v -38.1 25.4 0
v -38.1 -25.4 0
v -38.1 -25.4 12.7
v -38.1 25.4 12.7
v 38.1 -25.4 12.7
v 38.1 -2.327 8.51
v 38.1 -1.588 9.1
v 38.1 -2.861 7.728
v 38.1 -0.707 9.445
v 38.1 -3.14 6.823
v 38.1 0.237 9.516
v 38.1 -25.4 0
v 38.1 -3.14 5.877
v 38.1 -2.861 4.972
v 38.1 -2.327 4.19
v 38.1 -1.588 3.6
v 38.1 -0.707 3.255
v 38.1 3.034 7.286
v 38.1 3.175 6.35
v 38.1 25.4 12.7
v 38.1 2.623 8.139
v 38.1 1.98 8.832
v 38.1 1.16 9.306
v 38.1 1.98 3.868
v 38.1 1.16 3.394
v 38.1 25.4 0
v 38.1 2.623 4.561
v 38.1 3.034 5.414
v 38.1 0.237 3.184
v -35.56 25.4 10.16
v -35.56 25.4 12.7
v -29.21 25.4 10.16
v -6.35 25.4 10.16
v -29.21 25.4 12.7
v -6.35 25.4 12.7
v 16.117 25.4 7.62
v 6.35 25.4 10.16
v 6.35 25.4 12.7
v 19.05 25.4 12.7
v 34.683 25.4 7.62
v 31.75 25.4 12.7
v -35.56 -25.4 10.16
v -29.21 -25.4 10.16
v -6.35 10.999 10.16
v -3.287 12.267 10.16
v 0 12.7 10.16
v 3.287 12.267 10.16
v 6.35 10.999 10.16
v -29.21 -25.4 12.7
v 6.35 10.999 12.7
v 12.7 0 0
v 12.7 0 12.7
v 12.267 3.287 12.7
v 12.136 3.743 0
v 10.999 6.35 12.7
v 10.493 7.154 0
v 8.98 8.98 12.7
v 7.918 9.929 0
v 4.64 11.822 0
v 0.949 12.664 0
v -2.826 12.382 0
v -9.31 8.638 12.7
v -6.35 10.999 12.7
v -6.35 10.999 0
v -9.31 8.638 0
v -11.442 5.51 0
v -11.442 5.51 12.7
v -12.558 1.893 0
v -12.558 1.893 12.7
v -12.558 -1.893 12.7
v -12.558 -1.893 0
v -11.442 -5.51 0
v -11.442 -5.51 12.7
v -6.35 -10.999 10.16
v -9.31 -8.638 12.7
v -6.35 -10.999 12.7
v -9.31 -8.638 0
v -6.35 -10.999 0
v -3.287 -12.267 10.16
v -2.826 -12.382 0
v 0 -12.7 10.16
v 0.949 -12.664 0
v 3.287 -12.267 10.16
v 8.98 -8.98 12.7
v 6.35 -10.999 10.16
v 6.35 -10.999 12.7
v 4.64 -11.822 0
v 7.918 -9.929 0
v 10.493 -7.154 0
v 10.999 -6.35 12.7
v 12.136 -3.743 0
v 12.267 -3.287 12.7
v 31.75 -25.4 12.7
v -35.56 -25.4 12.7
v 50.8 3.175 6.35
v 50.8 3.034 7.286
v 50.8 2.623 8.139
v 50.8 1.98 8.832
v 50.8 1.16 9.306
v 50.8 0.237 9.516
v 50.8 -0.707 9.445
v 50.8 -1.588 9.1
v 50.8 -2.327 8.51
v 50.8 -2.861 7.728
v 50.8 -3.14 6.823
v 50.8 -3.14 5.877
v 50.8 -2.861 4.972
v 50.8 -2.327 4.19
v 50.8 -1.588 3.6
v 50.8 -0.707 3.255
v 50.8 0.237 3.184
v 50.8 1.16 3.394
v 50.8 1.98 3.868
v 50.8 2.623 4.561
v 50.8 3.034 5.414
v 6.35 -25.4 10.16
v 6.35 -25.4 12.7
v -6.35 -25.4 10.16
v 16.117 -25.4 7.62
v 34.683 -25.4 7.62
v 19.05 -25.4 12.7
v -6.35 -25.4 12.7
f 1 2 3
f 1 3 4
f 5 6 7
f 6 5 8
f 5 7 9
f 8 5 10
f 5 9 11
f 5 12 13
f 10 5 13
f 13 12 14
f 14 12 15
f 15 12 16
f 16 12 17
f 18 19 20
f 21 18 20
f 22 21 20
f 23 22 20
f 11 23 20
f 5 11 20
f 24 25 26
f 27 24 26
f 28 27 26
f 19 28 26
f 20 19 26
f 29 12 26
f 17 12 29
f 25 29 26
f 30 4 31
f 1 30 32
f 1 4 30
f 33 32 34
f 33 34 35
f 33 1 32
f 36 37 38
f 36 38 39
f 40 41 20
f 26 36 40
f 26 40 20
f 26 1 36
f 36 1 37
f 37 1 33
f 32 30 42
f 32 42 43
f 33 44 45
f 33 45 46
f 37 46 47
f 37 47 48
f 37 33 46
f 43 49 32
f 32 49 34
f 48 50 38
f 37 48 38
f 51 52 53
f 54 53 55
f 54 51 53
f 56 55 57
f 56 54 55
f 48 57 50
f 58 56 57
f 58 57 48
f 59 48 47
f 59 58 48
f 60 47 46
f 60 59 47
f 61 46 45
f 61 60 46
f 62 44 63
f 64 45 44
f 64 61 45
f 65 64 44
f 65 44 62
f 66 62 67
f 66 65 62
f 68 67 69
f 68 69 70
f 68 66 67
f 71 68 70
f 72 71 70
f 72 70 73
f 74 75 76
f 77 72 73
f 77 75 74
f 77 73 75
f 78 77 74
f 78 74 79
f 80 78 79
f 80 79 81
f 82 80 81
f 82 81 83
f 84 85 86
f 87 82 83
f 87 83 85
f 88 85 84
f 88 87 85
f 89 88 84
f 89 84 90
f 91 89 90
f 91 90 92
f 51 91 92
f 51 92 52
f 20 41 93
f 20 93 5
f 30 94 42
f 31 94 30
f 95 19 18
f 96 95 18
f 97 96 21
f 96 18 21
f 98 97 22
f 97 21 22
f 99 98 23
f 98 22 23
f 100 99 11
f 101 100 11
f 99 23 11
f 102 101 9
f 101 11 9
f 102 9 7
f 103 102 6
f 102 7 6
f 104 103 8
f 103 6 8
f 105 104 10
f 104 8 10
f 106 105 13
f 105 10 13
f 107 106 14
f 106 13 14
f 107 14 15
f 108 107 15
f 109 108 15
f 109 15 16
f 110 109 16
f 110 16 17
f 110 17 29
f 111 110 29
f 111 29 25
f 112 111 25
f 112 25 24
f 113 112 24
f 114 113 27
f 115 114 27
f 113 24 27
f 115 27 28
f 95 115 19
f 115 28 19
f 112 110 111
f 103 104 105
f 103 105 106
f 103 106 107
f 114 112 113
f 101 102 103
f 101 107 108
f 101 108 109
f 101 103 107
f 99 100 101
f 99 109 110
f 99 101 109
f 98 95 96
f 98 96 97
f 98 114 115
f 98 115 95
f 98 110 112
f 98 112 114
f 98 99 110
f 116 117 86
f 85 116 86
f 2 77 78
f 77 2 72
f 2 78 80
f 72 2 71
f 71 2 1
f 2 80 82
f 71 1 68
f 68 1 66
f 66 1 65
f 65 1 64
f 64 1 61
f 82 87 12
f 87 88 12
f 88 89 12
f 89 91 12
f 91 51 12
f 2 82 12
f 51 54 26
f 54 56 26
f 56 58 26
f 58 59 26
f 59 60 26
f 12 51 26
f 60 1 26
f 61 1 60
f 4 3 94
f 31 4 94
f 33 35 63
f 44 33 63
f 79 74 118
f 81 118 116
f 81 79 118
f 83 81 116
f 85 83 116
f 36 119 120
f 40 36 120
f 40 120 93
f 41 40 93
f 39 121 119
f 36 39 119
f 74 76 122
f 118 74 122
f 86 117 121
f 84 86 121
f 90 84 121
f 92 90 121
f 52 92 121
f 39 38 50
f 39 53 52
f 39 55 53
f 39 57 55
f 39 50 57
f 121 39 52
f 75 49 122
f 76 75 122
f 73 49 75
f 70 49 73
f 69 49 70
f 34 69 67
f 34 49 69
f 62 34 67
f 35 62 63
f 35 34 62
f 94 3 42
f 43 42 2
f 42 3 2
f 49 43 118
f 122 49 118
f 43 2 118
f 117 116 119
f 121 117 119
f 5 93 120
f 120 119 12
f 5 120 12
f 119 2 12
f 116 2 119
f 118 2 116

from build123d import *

# Parameters (mm, degrees)
F0_W     = 76.2
F0_H     = 50.8
F0_R     = 12.7
F1_DEPTH = 12.7
F2_W     = 6.35
F2_H     = 50.8
F3_DEPTH = 2.54
F5_DEPTH = 50.8
F6_R     = 3.175
F7_DEPTH = 12.7


with BuildPart() as f1:
    # F0 (on Top) → F1 (new body)
    with BuildSketch(Plane.XY):
        Rectangle(F0_W, F0_H)
        Circle(F0_R, mode=Mode.SUBTRACT)
    extrude(amount=F1_DEPTH)

    # F2 (on face) → F3 (cut)
    with BuildSketch(Plane.XY.offset(12.7)):
        with BuildLine():
            ThreePointArc((6.35, 10.9985226281), (0, 12.7), (-6.35, 10.9985226281))
            Line((-6.35, 10.9985226281), (-6.35, -10.9985226281))
            ThreePointArc((-6.35, -10.9985226281), (0, -12.7), (6.35, -10.9985226281))
            Line((6.35, -10.9985226281), (6.35, 10.9985226281))
        make_face()
        with Locations((-32.385, 0)):
            Rectangle(F2_W, F2_H)
        with BuildLine():
            Line((-6.35, -10.9985226281), (-6.35, -25.4))
            Line((-6.35, -25.4), (6.35, -25.4))
            Line((6.35, -25.4), (6.35, -10.9985226281))
            ThreePointArc((6.35, -10.9985226281), (0, -12.7), (-6.35, -10.9985226281))
        make_face()
        with BuildLine():
            Line((6.35, 25.4), (-6.35, 25.4))
            Line((-6.35, 25.4), (-6.35, 10.9985226281))
            ThreePointArc((-6.35, 10.9985226281), (0, 12.7), (6.35, 10.9985226281))
            Line((6.35, 10.9985226281), (6.35, 25.4))
        make_face()
    extrude(amount=-F3_DEPTH, mode=Mode.SUBTRACT)

    # F4 (on face) → F5 (cut, through all)
    with BuildSketch(Plane.XZ.offset(25.4)):
        Polygon((31.75, 12.7), (19.05, 12.7), (16.1170606325, 7.62), (34.6829393675, 7.62), align=None)
    extrude(amount=-F5_DEPTH, mode=Mode.SUBTRACT)

    # F6 (on face) → F7 (join)
    with BuildSketch(Plane.YZ.offset(38.1)):
        with Locations((0, 6.35)):
            Circle(F6_R)
    extrude(amount=F7_DEPTH)


solid = f1.part
